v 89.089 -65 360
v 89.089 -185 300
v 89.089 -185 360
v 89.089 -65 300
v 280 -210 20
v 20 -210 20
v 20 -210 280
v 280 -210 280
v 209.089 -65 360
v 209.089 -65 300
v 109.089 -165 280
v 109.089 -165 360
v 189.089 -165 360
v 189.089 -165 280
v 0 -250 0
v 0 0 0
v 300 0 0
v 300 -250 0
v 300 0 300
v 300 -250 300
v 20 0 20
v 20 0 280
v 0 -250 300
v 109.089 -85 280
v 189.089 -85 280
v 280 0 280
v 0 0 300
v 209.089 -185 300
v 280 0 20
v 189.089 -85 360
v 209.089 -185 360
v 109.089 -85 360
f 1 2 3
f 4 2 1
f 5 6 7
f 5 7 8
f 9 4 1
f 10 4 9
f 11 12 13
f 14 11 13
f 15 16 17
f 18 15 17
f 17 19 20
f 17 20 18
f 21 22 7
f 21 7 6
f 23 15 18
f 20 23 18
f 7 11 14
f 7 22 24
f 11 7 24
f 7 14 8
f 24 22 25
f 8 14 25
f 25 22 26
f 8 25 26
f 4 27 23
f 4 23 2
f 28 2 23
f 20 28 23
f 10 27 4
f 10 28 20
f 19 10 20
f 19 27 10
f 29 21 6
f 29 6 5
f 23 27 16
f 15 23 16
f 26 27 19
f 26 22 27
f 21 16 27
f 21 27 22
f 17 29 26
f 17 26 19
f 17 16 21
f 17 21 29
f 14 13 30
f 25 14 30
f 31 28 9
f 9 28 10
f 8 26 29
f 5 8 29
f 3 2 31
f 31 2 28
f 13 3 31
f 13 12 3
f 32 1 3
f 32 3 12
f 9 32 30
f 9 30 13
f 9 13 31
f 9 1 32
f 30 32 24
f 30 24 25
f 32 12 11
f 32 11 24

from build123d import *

# Parameters (mm, degrees)
SKETCH2_W           = 300
SKETCH2_H           = 300
BOSS_EXTRUDE1_DEPTH = 250
SKETCH4_W           = 260
SKETCH4_H           = 260
CUT_EXTRUDE2_DEPTH  = 210
SKETCH6_W           = 120
SKETCH6_H           = 120
BOSS_EXTRUDE2_DEPTH = 60
CUT_EXTRUDE7_REACH  = 362
SKETCH11_W          = 80
SKETCH11_H          = 80


with BuildPart() as part:
    # Sketch2 → Boss-Extrude1 (new body)
    with BuildSketch(Plane(origin=(0, 0, 0), x_dir=(1, 0, 0), z_dir=(0, 1, 0))):
        with Locations((150, -150)):
            Rectangle(SKETCH2_W, SKETCH2_H)
    extrude(amount=-BOSS_EXTRUDE1_DEPTH)

    # Sketch4 → Cut-Extrude2 (cut)
    with BuildSketch(Plane(origin=(0, 0, 0), x_dir=(1, 0, 0), z_dir=(0, 1, 0))):
        with Locations((150, -150)):
            Rectangle(SKETCH4_W, SKETCH4_H)
    extrude(amount=-CUT_EXTRUDE2_DEPTH, mode=Mode.SUBTRACT)

    # Sketch6 → Boss-Extrude2 (add)
    with BuildSketch(Plane.XY.offset(300)):
        with Locations((149.088747211, -125)):
            Rectangle(SKETCH6_W, SKETCH6_H)
    extrude(amount=BOSS_EXTRUDE2_DEPTH)

    # Sketch11 → Cut-Extrude7 (cut, up to next)
    with BuildSketch(Plane.XY.offset(360), mode=Mode.PRIVATE) as cut_extrude7_sk1:
        with Locations((149.088747211, -125)):
            Rectangle(SKETCH11_W, SKETCH11_H)
    cut_extrude7_tool1 = extrude(cut_extrude7_sk1.sketch, amount=-CUT_EXTRUDE7_REACH, mode=Mode.PRIVATE) & part.part
    add(cut_extrude7_tool1.solids().sort_by_distance((149.088747, -125, 360))[0], mode=Mode.SUBTRACT)


solid = part.part
